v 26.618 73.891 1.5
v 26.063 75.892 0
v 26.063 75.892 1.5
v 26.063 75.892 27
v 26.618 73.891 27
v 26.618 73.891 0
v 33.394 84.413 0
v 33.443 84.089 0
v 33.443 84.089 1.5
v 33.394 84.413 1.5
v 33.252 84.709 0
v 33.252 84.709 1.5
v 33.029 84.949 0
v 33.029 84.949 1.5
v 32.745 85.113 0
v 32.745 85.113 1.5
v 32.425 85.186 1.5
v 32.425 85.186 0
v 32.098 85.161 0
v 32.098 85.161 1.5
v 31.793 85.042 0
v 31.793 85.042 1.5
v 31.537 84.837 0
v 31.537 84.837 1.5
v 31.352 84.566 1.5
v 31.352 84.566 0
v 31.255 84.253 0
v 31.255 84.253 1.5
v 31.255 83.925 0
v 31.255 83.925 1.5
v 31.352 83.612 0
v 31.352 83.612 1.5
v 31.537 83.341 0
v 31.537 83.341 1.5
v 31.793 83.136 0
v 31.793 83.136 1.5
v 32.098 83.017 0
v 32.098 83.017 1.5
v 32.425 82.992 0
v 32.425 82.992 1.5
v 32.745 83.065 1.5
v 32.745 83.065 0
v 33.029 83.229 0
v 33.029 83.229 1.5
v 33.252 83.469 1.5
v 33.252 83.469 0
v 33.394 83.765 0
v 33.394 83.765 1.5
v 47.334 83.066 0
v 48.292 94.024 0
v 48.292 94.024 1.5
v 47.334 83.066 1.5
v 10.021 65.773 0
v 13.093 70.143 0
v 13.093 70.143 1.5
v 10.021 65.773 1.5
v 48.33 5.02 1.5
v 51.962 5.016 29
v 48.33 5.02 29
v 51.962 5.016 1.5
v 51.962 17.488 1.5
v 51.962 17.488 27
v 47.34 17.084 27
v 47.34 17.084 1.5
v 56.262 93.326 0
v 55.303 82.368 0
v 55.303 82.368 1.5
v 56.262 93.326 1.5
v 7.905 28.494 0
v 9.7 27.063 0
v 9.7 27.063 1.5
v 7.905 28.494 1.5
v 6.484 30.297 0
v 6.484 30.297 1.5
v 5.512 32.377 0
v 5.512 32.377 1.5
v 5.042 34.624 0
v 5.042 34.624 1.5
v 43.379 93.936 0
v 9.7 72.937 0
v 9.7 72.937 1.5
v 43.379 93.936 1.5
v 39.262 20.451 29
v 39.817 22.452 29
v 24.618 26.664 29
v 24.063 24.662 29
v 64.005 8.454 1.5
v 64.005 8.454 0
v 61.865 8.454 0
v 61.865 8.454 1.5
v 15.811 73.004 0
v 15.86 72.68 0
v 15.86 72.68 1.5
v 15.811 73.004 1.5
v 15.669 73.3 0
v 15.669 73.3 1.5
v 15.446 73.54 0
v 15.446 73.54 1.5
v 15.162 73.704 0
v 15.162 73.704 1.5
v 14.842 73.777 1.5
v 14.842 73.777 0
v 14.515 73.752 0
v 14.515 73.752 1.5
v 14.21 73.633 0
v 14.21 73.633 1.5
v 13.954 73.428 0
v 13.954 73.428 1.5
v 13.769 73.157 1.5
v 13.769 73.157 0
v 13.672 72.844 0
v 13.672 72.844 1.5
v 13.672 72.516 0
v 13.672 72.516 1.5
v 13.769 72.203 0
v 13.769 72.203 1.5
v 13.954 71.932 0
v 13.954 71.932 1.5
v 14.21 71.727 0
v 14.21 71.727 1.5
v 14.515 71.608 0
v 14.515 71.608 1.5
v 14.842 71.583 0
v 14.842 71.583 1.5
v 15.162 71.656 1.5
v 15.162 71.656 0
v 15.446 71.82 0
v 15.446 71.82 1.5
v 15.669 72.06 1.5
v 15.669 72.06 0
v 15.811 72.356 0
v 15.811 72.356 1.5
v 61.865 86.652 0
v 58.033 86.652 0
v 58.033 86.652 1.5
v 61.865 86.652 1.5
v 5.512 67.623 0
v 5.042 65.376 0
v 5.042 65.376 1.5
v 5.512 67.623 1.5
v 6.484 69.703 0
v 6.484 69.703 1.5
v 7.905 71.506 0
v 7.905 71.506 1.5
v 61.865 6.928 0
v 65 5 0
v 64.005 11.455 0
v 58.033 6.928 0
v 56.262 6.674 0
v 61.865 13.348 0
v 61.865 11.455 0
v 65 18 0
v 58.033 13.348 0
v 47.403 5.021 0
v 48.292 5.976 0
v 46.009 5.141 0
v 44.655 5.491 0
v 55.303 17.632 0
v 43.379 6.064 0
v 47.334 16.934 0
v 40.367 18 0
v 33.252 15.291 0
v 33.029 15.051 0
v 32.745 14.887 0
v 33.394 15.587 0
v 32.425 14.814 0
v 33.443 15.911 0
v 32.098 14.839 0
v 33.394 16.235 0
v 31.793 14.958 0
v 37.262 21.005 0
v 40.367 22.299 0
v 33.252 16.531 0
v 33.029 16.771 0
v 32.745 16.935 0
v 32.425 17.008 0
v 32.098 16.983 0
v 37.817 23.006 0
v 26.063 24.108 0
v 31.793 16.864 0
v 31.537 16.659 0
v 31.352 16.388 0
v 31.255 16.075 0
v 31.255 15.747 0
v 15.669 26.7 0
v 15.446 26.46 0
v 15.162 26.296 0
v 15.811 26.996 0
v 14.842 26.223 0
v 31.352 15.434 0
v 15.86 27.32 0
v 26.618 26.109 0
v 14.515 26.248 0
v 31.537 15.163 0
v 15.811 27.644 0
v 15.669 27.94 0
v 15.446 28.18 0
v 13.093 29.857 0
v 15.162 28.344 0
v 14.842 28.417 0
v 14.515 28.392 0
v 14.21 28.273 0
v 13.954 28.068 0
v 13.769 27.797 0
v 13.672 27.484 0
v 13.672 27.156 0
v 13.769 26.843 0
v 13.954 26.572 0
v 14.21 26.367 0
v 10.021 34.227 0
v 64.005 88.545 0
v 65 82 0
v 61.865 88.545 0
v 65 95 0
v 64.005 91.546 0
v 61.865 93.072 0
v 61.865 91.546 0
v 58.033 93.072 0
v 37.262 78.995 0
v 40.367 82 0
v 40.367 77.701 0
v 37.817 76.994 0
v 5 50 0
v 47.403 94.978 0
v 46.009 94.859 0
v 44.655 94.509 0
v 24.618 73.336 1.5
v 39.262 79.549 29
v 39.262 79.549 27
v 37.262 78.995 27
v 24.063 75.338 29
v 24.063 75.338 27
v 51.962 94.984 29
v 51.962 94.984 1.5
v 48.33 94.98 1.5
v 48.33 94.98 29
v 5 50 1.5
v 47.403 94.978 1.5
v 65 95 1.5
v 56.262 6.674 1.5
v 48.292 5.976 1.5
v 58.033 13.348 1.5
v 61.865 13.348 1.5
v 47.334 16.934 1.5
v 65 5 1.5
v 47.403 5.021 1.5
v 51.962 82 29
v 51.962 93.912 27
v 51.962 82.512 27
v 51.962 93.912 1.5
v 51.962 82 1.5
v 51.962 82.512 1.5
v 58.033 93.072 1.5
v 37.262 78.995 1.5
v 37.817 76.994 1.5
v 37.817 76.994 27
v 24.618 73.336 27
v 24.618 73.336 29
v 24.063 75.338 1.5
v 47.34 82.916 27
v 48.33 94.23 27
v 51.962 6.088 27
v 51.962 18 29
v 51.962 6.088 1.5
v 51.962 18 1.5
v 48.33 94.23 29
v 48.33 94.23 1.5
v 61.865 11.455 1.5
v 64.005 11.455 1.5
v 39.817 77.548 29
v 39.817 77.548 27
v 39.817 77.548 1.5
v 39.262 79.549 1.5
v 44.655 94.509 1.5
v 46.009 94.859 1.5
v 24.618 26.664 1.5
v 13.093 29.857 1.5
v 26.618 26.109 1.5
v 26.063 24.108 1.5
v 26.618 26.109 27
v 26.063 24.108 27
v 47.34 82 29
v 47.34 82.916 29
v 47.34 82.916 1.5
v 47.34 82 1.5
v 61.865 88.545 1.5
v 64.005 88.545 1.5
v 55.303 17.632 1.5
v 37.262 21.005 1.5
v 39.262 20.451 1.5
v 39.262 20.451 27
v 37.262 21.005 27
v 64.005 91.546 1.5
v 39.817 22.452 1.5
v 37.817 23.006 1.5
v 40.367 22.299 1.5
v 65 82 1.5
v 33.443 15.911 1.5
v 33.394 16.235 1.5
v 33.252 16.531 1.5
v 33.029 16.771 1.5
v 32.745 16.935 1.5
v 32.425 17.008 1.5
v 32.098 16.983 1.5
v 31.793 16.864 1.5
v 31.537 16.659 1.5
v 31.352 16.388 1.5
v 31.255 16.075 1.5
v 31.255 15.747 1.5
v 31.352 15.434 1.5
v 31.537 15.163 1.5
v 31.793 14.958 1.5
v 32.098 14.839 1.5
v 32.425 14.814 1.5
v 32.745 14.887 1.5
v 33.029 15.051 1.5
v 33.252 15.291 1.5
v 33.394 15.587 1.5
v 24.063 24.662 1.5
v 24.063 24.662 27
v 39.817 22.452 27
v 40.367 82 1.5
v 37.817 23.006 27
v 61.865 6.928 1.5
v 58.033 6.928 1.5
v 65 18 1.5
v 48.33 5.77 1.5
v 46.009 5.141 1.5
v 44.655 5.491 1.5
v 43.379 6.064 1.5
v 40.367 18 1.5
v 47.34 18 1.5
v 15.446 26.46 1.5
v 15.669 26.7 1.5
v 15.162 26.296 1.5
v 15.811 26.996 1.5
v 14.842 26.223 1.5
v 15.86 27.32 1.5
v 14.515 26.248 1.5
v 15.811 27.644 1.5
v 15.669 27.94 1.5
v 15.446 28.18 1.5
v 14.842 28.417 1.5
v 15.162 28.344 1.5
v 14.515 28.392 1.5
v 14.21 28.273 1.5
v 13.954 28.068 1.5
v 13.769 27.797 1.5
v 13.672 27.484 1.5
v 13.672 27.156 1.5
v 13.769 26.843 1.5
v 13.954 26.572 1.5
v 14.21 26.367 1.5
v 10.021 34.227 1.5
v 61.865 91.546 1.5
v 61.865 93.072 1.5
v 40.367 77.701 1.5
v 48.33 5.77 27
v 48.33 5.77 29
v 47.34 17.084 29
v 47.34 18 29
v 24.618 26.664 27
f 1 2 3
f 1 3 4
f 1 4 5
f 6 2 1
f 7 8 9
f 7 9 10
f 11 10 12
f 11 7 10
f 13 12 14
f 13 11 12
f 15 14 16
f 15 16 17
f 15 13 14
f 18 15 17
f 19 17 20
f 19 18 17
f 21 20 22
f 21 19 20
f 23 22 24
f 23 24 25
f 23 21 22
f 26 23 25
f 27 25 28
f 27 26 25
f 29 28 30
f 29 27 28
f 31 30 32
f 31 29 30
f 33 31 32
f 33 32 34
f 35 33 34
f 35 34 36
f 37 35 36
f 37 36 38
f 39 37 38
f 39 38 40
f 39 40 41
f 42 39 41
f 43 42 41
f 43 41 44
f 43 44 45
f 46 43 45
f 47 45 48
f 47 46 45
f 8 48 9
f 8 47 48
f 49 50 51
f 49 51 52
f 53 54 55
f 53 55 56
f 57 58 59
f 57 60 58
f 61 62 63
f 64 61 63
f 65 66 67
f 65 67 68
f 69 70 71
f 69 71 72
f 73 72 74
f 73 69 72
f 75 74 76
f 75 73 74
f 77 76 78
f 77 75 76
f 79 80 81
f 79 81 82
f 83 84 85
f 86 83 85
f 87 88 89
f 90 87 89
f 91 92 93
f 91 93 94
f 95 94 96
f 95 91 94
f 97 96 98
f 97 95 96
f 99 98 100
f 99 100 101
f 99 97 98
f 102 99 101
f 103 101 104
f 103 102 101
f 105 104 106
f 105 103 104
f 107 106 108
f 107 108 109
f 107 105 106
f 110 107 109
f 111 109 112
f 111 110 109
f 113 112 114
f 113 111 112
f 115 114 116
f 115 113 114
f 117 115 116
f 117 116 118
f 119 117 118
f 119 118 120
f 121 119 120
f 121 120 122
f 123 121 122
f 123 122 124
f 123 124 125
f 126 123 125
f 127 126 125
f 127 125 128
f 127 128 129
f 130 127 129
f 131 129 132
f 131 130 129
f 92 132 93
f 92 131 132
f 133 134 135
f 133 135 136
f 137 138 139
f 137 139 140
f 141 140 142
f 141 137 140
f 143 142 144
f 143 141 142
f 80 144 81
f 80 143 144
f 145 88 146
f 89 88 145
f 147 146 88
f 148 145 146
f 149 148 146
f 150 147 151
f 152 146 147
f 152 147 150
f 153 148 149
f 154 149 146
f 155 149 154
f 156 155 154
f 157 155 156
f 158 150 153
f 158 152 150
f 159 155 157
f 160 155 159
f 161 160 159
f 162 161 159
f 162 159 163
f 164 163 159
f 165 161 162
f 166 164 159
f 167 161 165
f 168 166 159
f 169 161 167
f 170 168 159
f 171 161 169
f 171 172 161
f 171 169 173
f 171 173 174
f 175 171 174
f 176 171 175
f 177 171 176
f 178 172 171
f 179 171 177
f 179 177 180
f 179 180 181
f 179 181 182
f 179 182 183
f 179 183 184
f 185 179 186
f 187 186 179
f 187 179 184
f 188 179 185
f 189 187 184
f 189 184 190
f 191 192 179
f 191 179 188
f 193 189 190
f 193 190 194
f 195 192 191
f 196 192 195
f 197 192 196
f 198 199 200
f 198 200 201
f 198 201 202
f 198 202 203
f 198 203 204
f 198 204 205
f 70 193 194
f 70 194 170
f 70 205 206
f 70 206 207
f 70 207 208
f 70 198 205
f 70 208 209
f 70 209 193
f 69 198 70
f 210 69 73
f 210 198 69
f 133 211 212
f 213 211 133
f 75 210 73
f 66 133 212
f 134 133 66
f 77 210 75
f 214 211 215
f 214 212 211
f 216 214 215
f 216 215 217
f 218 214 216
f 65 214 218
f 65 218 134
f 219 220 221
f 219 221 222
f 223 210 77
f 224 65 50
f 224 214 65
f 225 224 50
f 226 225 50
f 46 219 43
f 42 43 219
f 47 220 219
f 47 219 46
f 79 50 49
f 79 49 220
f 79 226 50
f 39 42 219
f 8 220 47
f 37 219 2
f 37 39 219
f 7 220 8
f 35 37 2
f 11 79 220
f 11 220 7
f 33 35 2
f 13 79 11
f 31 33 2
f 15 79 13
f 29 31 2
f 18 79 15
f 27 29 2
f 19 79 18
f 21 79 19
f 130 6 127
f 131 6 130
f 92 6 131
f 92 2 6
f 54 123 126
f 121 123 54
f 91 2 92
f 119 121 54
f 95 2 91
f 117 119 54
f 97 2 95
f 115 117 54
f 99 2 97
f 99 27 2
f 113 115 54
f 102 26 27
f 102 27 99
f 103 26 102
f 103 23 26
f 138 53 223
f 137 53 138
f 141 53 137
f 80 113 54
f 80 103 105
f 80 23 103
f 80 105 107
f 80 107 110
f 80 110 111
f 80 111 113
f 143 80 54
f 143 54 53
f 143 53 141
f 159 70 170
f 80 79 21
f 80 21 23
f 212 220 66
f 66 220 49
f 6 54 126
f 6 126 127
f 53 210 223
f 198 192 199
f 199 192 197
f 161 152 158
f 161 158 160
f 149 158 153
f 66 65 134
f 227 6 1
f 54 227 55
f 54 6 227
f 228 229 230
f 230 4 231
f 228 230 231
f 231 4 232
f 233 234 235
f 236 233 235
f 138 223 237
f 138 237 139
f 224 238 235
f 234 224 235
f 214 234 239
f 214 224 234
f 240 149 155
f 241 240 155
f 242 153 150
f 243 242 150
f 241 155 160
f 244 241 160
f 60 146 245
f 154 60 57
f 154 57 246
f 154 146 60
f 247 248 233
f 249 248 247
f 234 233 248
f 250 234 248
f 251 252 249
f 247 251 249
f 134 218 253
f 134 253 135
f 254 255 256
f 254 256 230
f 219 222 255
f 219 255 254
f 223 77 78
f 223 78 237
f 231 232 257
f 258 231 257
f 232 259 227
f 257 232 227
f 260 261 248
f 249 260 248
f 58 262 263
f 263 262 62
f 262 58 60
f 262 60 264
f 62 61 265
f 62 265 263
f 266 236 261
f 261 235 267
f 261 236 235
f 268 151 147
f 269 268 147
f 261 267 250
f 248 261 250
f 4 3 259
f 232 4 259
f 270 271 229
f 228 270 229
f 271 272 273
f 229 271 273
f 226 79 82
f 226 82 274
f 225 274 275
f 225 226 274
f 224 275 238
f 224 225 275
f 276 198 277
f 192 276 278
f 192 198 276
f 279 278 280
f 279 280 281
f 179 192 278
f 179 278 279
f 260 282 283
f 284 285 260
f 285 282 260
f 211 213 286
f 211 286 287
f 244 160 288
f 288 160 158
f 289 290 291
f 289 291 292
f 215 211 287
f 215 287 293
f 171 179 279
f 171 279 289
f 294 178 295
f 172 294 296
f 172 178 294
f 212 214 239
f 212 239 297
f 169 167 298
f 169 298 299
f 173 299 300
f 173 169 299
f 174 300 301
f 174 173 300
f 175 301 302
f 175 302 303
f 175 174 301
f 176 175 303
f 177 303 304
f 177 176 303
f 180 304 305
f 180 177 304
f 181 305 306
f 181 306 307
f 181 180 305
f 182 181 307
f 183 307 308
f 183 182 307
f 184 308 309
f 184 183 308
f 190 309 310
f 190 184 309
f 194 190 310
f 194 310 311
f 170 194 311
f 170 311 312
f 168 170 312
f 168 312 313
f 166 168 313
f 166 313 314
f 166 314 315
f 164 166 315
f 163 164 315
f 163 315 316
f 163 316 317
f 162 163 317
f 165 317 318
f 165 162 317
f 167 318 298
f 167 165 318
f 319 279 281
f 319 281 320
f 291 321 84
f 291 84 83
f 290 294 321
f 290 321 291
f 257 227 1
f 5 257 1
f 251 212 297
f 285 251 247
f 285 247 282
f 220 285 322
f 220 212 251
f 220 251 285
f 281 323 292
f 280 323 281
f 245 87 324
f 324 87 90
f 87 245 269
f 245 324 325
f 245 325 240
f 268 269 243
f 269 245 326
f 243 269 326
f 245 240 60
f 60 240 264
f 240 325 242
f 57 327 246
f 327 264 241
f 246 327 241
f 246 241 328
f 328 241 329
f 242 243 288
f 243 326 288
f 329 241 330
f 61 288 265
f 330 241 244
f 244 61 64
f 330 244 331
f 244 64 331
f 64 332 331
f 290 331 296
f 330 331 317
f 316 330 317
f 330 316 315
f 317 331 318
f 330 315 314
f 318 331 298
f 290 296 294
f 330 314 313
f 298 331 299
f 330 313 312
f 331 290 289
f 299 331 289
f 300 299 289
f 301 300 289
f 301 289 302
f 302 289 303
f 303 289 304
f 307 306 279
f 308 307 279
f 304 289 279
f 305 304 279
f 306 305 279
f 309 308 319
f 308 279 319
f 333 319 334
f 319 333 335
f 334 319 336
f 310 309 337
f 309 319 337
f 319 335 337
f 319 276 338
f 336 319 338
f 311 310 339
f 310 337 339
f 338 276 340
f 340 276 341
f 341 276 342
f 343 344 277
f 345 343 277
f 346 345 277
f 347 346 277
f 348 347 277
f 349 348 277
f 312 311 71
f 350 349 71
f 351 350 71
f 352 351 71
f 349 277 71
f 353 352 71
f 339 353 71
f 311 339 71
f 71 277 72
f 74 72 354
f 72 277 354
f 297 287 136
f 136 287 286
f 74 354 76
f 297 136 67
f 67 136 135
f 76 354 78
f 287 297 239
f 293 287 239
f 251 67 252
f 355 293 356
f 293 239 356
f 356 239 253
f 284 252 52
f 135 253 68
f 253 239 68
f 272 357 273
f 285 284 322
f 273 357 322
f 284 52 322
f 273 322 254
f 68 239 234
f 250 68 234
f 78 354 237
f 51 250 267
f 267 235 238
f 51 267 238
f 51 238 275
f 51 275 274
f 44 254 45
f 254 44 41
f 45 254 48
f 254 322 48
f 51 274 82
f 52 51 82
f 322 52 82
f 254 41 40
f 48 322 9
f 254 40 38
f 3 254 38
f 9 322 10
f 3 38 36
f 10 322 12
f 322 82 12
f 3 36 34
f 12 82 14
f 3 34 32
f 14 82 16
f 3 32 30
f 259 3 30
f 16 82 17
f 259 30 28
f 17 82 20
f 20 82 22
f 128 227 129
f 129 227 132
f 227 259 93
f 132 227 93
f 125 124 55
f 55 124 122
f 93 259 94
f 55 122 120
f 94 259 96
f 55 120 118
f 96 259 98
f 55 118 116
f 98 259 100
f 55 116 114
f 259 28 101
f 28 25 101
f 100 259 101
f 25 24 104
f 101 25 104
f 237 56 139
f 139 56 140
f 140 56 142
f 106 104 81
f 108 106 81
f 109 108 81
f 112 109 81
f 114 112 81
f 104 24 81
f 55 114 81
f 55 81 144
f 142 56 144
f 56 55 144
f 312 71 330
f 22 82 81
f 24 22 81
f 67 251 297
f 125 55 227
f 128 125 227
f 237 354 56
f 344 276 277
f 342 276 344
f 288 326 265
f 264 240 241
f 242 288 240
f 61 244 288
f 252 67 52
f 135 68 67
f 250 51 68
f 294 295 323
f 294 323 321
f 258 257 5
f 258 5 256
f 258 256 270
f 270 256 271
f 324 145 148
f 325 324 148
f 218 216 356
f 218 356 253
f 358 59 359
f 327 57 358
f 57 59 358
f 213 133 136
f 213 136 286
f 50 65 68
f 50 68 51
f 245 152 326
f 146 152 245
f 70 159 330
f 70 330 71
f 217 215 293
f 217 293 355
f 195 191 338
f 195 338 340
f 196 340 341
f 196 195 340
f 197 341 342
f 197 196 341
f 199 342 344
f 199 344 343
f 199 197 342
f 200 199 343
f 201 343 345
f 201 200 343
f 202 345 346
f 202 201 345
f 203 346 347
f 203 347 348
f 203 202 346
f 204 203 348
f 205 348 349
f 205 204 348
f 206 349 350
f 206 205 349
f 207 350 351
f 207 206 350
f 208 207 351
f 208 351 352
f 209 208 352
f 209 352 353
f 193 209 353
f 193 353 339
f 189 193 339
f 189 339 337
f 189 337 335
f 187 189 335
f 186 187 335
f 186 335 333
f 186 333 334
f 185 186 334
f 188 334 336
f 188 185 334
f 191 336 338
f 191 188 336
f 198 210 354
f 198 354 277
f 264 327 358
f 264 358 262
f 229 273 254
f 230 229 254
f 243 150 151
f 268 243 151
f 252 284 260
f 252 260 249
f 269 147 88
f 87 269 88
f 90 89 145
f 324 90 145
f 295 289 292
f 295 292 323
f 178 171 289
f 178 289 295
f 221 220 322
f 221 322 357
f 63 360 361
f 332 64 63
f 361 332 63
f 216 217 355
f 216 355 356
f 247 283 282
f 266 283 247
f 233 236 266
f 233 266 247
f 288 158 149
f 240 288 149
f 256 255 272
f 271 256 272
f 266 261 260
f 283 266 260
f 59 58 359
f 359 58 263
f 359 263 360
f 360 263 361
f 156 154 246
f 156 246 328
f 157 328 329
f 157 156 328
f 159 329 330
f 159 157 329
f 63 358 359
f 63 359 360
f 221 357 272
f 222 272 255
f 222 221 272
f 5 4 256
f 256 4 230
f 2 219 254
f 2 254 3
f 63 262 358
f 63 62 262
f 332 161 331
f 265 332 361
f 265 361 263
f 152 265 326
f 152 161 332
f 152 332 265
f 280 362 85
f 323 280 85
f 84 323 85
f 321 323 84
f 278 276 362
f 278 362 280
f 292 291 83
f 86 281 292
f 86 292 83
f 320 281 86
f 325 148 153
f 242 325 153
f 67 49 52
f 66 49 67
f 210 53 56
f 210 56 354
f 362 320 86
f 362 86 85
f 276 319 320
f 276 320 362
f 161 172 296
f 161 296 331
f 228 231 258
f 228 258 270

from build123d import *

# Parameters (mm, degrees)
SKETCH1_R           = 1.1
BOSS_EXTRUDE1_DEPTH = 1.5
BOSS_EXTRUDE2_DEPTH = 25.5
BOSS_EXTRUDE4_DEPTH = 2


with BuildPart() as part:
    # Sketch1 → Boss-Extrude1 (new body)
    with BuildSketch(Plane.XY):
        with BuildLine():
            Line((65, 15), (65, 5))
            Line((65, 5), (47.403, 5.0215))
            ThreePointArc((47.403, 5.0215), (45.32489976, 5.287606245), (43.379, 6.064))
            Line((43.379, 6.064), (9.7, 27.063))
            ThreePointArc((9.7, 27.063), (6.483564725, 30.296790106), (5.042, 34.624))
            Line((5.042, 34.624), (5, 50))
            Line((5, 50), (5.042, 65.376))
            ThreePointArc((5.042, 65.376), (6.483564725, 69.703209894), (9.7, 72.937))
            Line((9.7, 72.937), (43.379, 93.936))
            ThreePointArc((43.379, 93.936), (45.32489976, 94.712393755), (47.403, 94.9785))
            Line((47.403, 94.9785), (65, 95))
            Line((65, 95), (65, 85))
            Line((65, 85), (65, 82))
            Line((65, 82), (40.367460006, 82))
            Line((40.367460006, 82), (40.367460006, 77.700799702))
            Line((40.367460006, 77.700799702), (37.816539887, 76.993905452))
            Line((37.816539887, 76.993905452), (37.261948992, 78.995219046))
            Line((37.261948992, 78.995219046), (26.063497318, 75.891977576))
            Line((26.063497318, 75.891977576), (26.618088213, 73.890663982))
            Line((26.618088213, 73.890663982), (13.092809655, 70.14262751))
            Line((13.092809655, 70.14262751), (10.021, 65.77301003))
            Line((10.021, 65.77301003), (10.021, 34.22698997))
            Line((10.021, 34.22698997), (13.092809655, 29.85737249))
            Line((13.092809655, 29.85737249), (26.618088213, 26.109336018))
            Line((26.618088213, 26.109336018), (26.063497318, 24.108022424))
            Line((26.063497318, 24.108022424), (37.261948992, 21.004780954))
            Line((37.261948992, 21.004780954), (37.816539887, 23.006094548))
            Line((37.816539887, 23.006094548), (40.367460006, 22.299200298))
            Line((40.367460006, 22.299200298), (40.367460006, 18))
            Line((40.367460006, 18), (65, 18))
            Line((65, 18), (65, 15))
        make_face()
        with Locations((32.343, 84.089)):
            Circle(SKETCH1_R, mode=Mode.SUBTRACT)
        with Locations((14.76, 72.68)):
            Circle(SKETCH1_R, mode=Mode.SUBTRACT)
        with Locations((14.76, 27.32)):
            Circle(SKETCH1_R, mode=Mode.SUBTRACT)
        with Locations((32.343, 15.911)):
            Circle(SKETCH1_R, mode=Mode.SUBTRACT)
        Polygon((47.33363322, 83.065556795), (55.303190804, 82.368310853), (56.261903975, 93.326452532), (48.29234639, 94.023698474), align=None, mode=Mode.SUBTRACT)
        Polygon((58.032899046, 86.65175686), (61.864724228, 86.65175686), (61.864724228, 88.544627634), (64.004574654, 88.544627634), (64.004574654, 91.546423221), (61.864868117, 91.546423221), (61.864868117, 93.072013731), (58.032899046, 93.072013731), align=None, mode=Mode.SUBTRACT)
        Polygon((56.261903975, 6.673547468), (48.29234639, 5.976301526), (47.33363322, 16.934443205), (55.303190804, 17.631689147), align=None, mode=Mode.SUBTRACT)
        Polygon((58.032899046, 13.34824314), (61.864724228, 13.34824314), (61.864724228, 11.455372366), (64.004574654, 11.455372366), (64.004574654, 8.453576779), (61.864868117, 8.453576779), (61.864868117, 6.927986269), (58.032899046, 6.927986269), align=None, mode=Mode.SUBTRACT)
    extrude(amount=BOSS_EXTRUDE1_DEPTH)

    # Sketch2 → Boss-Extrude2 (add)
    with BuildSketch(Plane.XY.offset(1.5)):
        Polygon((26.618088213, 26.109336018), (26.063497318, 24.108022424), (24.063497318, 24.662249304), (24.618088213, 26.663562898), align=None)
        Polygon((37.261948992, 21.004780954), (37.816539887, 23.006094548), (39.816539887, 22.451867667), (39.261948992, 20.450554074), align=None)
        Polygon((39.816539887, 77.548132333), (39.261948992, 79.549445926), (37.261948992, 78.995219046), (37.816539887, 76.993905452), align=None)
        Polygon((26.063497318, 75.891977576), (24.063497318, 75.337750696), (24.618088213, 73.336437102), (26.618088213, 73.890663982), align=None)
        Polygon((47.340340229, 18), (51.96241715, 18), (51.96241715, 17.488205474), (47.340340229, 17.083826141), align=None)
        Polygon((48.330167759, 5.770045696), (51.96241715, 6.087826341), (51.96241715, 5.015929308), (48.330167759, 5.020367187), (48.330167759, 5.551877825), align=None)
        Polygon((48.330167759, 94.979632813), (48.330167759, 94.448122175), (48.330167759, 94.229954304), (51.96241715, 93.912173659), (51.96241715, 94.984070692), align=None)
        Polygon((47.340340229, 82.916173859), (51.96241715, 82.511794526), (51.96241715, 82), (47.340340229, 82), align=None)
    extrude(amount=BOSS_EXTRUDE2_DEPTH)

    # Sketch4 → Boss-Extrude4 (add)
    with BuildSketch(Plane.XY.offset(27)):
        Polygon((48.330167759, 5.020367187), (48.330167759, 5.770045696), (47.340340229, 17.083826141), (47.340340229, 18), (51.96241715, 18), (51.96241715, 17.488205474), (51.96241715, 5.015929308), align=None)
        Polygon((24.618088213, 26.663562898), (39.816539887, 22.451867667), (39.261948992, 20.450554074), (24.063497318, 24.662249304), align=None)
        Polygon((51.96241715, 82.511794526), (51.96241715, 94.984070692), (48.330167759, 94.979632813), (48.330167759, 94.229954304), (47.340340229, 82.916173859), (47.340340229, 82), (51.96241715, 82), align=None)
        Polygon((39.261948992, 79.549445926), (24.063497318, 75.337750696), (24.618088213, 73.336437102), (39.816539887, 77.548132333), align=None)
    extrude(amount=BOSS_EXTRUDE4_DEPTH)


solid = part.part
